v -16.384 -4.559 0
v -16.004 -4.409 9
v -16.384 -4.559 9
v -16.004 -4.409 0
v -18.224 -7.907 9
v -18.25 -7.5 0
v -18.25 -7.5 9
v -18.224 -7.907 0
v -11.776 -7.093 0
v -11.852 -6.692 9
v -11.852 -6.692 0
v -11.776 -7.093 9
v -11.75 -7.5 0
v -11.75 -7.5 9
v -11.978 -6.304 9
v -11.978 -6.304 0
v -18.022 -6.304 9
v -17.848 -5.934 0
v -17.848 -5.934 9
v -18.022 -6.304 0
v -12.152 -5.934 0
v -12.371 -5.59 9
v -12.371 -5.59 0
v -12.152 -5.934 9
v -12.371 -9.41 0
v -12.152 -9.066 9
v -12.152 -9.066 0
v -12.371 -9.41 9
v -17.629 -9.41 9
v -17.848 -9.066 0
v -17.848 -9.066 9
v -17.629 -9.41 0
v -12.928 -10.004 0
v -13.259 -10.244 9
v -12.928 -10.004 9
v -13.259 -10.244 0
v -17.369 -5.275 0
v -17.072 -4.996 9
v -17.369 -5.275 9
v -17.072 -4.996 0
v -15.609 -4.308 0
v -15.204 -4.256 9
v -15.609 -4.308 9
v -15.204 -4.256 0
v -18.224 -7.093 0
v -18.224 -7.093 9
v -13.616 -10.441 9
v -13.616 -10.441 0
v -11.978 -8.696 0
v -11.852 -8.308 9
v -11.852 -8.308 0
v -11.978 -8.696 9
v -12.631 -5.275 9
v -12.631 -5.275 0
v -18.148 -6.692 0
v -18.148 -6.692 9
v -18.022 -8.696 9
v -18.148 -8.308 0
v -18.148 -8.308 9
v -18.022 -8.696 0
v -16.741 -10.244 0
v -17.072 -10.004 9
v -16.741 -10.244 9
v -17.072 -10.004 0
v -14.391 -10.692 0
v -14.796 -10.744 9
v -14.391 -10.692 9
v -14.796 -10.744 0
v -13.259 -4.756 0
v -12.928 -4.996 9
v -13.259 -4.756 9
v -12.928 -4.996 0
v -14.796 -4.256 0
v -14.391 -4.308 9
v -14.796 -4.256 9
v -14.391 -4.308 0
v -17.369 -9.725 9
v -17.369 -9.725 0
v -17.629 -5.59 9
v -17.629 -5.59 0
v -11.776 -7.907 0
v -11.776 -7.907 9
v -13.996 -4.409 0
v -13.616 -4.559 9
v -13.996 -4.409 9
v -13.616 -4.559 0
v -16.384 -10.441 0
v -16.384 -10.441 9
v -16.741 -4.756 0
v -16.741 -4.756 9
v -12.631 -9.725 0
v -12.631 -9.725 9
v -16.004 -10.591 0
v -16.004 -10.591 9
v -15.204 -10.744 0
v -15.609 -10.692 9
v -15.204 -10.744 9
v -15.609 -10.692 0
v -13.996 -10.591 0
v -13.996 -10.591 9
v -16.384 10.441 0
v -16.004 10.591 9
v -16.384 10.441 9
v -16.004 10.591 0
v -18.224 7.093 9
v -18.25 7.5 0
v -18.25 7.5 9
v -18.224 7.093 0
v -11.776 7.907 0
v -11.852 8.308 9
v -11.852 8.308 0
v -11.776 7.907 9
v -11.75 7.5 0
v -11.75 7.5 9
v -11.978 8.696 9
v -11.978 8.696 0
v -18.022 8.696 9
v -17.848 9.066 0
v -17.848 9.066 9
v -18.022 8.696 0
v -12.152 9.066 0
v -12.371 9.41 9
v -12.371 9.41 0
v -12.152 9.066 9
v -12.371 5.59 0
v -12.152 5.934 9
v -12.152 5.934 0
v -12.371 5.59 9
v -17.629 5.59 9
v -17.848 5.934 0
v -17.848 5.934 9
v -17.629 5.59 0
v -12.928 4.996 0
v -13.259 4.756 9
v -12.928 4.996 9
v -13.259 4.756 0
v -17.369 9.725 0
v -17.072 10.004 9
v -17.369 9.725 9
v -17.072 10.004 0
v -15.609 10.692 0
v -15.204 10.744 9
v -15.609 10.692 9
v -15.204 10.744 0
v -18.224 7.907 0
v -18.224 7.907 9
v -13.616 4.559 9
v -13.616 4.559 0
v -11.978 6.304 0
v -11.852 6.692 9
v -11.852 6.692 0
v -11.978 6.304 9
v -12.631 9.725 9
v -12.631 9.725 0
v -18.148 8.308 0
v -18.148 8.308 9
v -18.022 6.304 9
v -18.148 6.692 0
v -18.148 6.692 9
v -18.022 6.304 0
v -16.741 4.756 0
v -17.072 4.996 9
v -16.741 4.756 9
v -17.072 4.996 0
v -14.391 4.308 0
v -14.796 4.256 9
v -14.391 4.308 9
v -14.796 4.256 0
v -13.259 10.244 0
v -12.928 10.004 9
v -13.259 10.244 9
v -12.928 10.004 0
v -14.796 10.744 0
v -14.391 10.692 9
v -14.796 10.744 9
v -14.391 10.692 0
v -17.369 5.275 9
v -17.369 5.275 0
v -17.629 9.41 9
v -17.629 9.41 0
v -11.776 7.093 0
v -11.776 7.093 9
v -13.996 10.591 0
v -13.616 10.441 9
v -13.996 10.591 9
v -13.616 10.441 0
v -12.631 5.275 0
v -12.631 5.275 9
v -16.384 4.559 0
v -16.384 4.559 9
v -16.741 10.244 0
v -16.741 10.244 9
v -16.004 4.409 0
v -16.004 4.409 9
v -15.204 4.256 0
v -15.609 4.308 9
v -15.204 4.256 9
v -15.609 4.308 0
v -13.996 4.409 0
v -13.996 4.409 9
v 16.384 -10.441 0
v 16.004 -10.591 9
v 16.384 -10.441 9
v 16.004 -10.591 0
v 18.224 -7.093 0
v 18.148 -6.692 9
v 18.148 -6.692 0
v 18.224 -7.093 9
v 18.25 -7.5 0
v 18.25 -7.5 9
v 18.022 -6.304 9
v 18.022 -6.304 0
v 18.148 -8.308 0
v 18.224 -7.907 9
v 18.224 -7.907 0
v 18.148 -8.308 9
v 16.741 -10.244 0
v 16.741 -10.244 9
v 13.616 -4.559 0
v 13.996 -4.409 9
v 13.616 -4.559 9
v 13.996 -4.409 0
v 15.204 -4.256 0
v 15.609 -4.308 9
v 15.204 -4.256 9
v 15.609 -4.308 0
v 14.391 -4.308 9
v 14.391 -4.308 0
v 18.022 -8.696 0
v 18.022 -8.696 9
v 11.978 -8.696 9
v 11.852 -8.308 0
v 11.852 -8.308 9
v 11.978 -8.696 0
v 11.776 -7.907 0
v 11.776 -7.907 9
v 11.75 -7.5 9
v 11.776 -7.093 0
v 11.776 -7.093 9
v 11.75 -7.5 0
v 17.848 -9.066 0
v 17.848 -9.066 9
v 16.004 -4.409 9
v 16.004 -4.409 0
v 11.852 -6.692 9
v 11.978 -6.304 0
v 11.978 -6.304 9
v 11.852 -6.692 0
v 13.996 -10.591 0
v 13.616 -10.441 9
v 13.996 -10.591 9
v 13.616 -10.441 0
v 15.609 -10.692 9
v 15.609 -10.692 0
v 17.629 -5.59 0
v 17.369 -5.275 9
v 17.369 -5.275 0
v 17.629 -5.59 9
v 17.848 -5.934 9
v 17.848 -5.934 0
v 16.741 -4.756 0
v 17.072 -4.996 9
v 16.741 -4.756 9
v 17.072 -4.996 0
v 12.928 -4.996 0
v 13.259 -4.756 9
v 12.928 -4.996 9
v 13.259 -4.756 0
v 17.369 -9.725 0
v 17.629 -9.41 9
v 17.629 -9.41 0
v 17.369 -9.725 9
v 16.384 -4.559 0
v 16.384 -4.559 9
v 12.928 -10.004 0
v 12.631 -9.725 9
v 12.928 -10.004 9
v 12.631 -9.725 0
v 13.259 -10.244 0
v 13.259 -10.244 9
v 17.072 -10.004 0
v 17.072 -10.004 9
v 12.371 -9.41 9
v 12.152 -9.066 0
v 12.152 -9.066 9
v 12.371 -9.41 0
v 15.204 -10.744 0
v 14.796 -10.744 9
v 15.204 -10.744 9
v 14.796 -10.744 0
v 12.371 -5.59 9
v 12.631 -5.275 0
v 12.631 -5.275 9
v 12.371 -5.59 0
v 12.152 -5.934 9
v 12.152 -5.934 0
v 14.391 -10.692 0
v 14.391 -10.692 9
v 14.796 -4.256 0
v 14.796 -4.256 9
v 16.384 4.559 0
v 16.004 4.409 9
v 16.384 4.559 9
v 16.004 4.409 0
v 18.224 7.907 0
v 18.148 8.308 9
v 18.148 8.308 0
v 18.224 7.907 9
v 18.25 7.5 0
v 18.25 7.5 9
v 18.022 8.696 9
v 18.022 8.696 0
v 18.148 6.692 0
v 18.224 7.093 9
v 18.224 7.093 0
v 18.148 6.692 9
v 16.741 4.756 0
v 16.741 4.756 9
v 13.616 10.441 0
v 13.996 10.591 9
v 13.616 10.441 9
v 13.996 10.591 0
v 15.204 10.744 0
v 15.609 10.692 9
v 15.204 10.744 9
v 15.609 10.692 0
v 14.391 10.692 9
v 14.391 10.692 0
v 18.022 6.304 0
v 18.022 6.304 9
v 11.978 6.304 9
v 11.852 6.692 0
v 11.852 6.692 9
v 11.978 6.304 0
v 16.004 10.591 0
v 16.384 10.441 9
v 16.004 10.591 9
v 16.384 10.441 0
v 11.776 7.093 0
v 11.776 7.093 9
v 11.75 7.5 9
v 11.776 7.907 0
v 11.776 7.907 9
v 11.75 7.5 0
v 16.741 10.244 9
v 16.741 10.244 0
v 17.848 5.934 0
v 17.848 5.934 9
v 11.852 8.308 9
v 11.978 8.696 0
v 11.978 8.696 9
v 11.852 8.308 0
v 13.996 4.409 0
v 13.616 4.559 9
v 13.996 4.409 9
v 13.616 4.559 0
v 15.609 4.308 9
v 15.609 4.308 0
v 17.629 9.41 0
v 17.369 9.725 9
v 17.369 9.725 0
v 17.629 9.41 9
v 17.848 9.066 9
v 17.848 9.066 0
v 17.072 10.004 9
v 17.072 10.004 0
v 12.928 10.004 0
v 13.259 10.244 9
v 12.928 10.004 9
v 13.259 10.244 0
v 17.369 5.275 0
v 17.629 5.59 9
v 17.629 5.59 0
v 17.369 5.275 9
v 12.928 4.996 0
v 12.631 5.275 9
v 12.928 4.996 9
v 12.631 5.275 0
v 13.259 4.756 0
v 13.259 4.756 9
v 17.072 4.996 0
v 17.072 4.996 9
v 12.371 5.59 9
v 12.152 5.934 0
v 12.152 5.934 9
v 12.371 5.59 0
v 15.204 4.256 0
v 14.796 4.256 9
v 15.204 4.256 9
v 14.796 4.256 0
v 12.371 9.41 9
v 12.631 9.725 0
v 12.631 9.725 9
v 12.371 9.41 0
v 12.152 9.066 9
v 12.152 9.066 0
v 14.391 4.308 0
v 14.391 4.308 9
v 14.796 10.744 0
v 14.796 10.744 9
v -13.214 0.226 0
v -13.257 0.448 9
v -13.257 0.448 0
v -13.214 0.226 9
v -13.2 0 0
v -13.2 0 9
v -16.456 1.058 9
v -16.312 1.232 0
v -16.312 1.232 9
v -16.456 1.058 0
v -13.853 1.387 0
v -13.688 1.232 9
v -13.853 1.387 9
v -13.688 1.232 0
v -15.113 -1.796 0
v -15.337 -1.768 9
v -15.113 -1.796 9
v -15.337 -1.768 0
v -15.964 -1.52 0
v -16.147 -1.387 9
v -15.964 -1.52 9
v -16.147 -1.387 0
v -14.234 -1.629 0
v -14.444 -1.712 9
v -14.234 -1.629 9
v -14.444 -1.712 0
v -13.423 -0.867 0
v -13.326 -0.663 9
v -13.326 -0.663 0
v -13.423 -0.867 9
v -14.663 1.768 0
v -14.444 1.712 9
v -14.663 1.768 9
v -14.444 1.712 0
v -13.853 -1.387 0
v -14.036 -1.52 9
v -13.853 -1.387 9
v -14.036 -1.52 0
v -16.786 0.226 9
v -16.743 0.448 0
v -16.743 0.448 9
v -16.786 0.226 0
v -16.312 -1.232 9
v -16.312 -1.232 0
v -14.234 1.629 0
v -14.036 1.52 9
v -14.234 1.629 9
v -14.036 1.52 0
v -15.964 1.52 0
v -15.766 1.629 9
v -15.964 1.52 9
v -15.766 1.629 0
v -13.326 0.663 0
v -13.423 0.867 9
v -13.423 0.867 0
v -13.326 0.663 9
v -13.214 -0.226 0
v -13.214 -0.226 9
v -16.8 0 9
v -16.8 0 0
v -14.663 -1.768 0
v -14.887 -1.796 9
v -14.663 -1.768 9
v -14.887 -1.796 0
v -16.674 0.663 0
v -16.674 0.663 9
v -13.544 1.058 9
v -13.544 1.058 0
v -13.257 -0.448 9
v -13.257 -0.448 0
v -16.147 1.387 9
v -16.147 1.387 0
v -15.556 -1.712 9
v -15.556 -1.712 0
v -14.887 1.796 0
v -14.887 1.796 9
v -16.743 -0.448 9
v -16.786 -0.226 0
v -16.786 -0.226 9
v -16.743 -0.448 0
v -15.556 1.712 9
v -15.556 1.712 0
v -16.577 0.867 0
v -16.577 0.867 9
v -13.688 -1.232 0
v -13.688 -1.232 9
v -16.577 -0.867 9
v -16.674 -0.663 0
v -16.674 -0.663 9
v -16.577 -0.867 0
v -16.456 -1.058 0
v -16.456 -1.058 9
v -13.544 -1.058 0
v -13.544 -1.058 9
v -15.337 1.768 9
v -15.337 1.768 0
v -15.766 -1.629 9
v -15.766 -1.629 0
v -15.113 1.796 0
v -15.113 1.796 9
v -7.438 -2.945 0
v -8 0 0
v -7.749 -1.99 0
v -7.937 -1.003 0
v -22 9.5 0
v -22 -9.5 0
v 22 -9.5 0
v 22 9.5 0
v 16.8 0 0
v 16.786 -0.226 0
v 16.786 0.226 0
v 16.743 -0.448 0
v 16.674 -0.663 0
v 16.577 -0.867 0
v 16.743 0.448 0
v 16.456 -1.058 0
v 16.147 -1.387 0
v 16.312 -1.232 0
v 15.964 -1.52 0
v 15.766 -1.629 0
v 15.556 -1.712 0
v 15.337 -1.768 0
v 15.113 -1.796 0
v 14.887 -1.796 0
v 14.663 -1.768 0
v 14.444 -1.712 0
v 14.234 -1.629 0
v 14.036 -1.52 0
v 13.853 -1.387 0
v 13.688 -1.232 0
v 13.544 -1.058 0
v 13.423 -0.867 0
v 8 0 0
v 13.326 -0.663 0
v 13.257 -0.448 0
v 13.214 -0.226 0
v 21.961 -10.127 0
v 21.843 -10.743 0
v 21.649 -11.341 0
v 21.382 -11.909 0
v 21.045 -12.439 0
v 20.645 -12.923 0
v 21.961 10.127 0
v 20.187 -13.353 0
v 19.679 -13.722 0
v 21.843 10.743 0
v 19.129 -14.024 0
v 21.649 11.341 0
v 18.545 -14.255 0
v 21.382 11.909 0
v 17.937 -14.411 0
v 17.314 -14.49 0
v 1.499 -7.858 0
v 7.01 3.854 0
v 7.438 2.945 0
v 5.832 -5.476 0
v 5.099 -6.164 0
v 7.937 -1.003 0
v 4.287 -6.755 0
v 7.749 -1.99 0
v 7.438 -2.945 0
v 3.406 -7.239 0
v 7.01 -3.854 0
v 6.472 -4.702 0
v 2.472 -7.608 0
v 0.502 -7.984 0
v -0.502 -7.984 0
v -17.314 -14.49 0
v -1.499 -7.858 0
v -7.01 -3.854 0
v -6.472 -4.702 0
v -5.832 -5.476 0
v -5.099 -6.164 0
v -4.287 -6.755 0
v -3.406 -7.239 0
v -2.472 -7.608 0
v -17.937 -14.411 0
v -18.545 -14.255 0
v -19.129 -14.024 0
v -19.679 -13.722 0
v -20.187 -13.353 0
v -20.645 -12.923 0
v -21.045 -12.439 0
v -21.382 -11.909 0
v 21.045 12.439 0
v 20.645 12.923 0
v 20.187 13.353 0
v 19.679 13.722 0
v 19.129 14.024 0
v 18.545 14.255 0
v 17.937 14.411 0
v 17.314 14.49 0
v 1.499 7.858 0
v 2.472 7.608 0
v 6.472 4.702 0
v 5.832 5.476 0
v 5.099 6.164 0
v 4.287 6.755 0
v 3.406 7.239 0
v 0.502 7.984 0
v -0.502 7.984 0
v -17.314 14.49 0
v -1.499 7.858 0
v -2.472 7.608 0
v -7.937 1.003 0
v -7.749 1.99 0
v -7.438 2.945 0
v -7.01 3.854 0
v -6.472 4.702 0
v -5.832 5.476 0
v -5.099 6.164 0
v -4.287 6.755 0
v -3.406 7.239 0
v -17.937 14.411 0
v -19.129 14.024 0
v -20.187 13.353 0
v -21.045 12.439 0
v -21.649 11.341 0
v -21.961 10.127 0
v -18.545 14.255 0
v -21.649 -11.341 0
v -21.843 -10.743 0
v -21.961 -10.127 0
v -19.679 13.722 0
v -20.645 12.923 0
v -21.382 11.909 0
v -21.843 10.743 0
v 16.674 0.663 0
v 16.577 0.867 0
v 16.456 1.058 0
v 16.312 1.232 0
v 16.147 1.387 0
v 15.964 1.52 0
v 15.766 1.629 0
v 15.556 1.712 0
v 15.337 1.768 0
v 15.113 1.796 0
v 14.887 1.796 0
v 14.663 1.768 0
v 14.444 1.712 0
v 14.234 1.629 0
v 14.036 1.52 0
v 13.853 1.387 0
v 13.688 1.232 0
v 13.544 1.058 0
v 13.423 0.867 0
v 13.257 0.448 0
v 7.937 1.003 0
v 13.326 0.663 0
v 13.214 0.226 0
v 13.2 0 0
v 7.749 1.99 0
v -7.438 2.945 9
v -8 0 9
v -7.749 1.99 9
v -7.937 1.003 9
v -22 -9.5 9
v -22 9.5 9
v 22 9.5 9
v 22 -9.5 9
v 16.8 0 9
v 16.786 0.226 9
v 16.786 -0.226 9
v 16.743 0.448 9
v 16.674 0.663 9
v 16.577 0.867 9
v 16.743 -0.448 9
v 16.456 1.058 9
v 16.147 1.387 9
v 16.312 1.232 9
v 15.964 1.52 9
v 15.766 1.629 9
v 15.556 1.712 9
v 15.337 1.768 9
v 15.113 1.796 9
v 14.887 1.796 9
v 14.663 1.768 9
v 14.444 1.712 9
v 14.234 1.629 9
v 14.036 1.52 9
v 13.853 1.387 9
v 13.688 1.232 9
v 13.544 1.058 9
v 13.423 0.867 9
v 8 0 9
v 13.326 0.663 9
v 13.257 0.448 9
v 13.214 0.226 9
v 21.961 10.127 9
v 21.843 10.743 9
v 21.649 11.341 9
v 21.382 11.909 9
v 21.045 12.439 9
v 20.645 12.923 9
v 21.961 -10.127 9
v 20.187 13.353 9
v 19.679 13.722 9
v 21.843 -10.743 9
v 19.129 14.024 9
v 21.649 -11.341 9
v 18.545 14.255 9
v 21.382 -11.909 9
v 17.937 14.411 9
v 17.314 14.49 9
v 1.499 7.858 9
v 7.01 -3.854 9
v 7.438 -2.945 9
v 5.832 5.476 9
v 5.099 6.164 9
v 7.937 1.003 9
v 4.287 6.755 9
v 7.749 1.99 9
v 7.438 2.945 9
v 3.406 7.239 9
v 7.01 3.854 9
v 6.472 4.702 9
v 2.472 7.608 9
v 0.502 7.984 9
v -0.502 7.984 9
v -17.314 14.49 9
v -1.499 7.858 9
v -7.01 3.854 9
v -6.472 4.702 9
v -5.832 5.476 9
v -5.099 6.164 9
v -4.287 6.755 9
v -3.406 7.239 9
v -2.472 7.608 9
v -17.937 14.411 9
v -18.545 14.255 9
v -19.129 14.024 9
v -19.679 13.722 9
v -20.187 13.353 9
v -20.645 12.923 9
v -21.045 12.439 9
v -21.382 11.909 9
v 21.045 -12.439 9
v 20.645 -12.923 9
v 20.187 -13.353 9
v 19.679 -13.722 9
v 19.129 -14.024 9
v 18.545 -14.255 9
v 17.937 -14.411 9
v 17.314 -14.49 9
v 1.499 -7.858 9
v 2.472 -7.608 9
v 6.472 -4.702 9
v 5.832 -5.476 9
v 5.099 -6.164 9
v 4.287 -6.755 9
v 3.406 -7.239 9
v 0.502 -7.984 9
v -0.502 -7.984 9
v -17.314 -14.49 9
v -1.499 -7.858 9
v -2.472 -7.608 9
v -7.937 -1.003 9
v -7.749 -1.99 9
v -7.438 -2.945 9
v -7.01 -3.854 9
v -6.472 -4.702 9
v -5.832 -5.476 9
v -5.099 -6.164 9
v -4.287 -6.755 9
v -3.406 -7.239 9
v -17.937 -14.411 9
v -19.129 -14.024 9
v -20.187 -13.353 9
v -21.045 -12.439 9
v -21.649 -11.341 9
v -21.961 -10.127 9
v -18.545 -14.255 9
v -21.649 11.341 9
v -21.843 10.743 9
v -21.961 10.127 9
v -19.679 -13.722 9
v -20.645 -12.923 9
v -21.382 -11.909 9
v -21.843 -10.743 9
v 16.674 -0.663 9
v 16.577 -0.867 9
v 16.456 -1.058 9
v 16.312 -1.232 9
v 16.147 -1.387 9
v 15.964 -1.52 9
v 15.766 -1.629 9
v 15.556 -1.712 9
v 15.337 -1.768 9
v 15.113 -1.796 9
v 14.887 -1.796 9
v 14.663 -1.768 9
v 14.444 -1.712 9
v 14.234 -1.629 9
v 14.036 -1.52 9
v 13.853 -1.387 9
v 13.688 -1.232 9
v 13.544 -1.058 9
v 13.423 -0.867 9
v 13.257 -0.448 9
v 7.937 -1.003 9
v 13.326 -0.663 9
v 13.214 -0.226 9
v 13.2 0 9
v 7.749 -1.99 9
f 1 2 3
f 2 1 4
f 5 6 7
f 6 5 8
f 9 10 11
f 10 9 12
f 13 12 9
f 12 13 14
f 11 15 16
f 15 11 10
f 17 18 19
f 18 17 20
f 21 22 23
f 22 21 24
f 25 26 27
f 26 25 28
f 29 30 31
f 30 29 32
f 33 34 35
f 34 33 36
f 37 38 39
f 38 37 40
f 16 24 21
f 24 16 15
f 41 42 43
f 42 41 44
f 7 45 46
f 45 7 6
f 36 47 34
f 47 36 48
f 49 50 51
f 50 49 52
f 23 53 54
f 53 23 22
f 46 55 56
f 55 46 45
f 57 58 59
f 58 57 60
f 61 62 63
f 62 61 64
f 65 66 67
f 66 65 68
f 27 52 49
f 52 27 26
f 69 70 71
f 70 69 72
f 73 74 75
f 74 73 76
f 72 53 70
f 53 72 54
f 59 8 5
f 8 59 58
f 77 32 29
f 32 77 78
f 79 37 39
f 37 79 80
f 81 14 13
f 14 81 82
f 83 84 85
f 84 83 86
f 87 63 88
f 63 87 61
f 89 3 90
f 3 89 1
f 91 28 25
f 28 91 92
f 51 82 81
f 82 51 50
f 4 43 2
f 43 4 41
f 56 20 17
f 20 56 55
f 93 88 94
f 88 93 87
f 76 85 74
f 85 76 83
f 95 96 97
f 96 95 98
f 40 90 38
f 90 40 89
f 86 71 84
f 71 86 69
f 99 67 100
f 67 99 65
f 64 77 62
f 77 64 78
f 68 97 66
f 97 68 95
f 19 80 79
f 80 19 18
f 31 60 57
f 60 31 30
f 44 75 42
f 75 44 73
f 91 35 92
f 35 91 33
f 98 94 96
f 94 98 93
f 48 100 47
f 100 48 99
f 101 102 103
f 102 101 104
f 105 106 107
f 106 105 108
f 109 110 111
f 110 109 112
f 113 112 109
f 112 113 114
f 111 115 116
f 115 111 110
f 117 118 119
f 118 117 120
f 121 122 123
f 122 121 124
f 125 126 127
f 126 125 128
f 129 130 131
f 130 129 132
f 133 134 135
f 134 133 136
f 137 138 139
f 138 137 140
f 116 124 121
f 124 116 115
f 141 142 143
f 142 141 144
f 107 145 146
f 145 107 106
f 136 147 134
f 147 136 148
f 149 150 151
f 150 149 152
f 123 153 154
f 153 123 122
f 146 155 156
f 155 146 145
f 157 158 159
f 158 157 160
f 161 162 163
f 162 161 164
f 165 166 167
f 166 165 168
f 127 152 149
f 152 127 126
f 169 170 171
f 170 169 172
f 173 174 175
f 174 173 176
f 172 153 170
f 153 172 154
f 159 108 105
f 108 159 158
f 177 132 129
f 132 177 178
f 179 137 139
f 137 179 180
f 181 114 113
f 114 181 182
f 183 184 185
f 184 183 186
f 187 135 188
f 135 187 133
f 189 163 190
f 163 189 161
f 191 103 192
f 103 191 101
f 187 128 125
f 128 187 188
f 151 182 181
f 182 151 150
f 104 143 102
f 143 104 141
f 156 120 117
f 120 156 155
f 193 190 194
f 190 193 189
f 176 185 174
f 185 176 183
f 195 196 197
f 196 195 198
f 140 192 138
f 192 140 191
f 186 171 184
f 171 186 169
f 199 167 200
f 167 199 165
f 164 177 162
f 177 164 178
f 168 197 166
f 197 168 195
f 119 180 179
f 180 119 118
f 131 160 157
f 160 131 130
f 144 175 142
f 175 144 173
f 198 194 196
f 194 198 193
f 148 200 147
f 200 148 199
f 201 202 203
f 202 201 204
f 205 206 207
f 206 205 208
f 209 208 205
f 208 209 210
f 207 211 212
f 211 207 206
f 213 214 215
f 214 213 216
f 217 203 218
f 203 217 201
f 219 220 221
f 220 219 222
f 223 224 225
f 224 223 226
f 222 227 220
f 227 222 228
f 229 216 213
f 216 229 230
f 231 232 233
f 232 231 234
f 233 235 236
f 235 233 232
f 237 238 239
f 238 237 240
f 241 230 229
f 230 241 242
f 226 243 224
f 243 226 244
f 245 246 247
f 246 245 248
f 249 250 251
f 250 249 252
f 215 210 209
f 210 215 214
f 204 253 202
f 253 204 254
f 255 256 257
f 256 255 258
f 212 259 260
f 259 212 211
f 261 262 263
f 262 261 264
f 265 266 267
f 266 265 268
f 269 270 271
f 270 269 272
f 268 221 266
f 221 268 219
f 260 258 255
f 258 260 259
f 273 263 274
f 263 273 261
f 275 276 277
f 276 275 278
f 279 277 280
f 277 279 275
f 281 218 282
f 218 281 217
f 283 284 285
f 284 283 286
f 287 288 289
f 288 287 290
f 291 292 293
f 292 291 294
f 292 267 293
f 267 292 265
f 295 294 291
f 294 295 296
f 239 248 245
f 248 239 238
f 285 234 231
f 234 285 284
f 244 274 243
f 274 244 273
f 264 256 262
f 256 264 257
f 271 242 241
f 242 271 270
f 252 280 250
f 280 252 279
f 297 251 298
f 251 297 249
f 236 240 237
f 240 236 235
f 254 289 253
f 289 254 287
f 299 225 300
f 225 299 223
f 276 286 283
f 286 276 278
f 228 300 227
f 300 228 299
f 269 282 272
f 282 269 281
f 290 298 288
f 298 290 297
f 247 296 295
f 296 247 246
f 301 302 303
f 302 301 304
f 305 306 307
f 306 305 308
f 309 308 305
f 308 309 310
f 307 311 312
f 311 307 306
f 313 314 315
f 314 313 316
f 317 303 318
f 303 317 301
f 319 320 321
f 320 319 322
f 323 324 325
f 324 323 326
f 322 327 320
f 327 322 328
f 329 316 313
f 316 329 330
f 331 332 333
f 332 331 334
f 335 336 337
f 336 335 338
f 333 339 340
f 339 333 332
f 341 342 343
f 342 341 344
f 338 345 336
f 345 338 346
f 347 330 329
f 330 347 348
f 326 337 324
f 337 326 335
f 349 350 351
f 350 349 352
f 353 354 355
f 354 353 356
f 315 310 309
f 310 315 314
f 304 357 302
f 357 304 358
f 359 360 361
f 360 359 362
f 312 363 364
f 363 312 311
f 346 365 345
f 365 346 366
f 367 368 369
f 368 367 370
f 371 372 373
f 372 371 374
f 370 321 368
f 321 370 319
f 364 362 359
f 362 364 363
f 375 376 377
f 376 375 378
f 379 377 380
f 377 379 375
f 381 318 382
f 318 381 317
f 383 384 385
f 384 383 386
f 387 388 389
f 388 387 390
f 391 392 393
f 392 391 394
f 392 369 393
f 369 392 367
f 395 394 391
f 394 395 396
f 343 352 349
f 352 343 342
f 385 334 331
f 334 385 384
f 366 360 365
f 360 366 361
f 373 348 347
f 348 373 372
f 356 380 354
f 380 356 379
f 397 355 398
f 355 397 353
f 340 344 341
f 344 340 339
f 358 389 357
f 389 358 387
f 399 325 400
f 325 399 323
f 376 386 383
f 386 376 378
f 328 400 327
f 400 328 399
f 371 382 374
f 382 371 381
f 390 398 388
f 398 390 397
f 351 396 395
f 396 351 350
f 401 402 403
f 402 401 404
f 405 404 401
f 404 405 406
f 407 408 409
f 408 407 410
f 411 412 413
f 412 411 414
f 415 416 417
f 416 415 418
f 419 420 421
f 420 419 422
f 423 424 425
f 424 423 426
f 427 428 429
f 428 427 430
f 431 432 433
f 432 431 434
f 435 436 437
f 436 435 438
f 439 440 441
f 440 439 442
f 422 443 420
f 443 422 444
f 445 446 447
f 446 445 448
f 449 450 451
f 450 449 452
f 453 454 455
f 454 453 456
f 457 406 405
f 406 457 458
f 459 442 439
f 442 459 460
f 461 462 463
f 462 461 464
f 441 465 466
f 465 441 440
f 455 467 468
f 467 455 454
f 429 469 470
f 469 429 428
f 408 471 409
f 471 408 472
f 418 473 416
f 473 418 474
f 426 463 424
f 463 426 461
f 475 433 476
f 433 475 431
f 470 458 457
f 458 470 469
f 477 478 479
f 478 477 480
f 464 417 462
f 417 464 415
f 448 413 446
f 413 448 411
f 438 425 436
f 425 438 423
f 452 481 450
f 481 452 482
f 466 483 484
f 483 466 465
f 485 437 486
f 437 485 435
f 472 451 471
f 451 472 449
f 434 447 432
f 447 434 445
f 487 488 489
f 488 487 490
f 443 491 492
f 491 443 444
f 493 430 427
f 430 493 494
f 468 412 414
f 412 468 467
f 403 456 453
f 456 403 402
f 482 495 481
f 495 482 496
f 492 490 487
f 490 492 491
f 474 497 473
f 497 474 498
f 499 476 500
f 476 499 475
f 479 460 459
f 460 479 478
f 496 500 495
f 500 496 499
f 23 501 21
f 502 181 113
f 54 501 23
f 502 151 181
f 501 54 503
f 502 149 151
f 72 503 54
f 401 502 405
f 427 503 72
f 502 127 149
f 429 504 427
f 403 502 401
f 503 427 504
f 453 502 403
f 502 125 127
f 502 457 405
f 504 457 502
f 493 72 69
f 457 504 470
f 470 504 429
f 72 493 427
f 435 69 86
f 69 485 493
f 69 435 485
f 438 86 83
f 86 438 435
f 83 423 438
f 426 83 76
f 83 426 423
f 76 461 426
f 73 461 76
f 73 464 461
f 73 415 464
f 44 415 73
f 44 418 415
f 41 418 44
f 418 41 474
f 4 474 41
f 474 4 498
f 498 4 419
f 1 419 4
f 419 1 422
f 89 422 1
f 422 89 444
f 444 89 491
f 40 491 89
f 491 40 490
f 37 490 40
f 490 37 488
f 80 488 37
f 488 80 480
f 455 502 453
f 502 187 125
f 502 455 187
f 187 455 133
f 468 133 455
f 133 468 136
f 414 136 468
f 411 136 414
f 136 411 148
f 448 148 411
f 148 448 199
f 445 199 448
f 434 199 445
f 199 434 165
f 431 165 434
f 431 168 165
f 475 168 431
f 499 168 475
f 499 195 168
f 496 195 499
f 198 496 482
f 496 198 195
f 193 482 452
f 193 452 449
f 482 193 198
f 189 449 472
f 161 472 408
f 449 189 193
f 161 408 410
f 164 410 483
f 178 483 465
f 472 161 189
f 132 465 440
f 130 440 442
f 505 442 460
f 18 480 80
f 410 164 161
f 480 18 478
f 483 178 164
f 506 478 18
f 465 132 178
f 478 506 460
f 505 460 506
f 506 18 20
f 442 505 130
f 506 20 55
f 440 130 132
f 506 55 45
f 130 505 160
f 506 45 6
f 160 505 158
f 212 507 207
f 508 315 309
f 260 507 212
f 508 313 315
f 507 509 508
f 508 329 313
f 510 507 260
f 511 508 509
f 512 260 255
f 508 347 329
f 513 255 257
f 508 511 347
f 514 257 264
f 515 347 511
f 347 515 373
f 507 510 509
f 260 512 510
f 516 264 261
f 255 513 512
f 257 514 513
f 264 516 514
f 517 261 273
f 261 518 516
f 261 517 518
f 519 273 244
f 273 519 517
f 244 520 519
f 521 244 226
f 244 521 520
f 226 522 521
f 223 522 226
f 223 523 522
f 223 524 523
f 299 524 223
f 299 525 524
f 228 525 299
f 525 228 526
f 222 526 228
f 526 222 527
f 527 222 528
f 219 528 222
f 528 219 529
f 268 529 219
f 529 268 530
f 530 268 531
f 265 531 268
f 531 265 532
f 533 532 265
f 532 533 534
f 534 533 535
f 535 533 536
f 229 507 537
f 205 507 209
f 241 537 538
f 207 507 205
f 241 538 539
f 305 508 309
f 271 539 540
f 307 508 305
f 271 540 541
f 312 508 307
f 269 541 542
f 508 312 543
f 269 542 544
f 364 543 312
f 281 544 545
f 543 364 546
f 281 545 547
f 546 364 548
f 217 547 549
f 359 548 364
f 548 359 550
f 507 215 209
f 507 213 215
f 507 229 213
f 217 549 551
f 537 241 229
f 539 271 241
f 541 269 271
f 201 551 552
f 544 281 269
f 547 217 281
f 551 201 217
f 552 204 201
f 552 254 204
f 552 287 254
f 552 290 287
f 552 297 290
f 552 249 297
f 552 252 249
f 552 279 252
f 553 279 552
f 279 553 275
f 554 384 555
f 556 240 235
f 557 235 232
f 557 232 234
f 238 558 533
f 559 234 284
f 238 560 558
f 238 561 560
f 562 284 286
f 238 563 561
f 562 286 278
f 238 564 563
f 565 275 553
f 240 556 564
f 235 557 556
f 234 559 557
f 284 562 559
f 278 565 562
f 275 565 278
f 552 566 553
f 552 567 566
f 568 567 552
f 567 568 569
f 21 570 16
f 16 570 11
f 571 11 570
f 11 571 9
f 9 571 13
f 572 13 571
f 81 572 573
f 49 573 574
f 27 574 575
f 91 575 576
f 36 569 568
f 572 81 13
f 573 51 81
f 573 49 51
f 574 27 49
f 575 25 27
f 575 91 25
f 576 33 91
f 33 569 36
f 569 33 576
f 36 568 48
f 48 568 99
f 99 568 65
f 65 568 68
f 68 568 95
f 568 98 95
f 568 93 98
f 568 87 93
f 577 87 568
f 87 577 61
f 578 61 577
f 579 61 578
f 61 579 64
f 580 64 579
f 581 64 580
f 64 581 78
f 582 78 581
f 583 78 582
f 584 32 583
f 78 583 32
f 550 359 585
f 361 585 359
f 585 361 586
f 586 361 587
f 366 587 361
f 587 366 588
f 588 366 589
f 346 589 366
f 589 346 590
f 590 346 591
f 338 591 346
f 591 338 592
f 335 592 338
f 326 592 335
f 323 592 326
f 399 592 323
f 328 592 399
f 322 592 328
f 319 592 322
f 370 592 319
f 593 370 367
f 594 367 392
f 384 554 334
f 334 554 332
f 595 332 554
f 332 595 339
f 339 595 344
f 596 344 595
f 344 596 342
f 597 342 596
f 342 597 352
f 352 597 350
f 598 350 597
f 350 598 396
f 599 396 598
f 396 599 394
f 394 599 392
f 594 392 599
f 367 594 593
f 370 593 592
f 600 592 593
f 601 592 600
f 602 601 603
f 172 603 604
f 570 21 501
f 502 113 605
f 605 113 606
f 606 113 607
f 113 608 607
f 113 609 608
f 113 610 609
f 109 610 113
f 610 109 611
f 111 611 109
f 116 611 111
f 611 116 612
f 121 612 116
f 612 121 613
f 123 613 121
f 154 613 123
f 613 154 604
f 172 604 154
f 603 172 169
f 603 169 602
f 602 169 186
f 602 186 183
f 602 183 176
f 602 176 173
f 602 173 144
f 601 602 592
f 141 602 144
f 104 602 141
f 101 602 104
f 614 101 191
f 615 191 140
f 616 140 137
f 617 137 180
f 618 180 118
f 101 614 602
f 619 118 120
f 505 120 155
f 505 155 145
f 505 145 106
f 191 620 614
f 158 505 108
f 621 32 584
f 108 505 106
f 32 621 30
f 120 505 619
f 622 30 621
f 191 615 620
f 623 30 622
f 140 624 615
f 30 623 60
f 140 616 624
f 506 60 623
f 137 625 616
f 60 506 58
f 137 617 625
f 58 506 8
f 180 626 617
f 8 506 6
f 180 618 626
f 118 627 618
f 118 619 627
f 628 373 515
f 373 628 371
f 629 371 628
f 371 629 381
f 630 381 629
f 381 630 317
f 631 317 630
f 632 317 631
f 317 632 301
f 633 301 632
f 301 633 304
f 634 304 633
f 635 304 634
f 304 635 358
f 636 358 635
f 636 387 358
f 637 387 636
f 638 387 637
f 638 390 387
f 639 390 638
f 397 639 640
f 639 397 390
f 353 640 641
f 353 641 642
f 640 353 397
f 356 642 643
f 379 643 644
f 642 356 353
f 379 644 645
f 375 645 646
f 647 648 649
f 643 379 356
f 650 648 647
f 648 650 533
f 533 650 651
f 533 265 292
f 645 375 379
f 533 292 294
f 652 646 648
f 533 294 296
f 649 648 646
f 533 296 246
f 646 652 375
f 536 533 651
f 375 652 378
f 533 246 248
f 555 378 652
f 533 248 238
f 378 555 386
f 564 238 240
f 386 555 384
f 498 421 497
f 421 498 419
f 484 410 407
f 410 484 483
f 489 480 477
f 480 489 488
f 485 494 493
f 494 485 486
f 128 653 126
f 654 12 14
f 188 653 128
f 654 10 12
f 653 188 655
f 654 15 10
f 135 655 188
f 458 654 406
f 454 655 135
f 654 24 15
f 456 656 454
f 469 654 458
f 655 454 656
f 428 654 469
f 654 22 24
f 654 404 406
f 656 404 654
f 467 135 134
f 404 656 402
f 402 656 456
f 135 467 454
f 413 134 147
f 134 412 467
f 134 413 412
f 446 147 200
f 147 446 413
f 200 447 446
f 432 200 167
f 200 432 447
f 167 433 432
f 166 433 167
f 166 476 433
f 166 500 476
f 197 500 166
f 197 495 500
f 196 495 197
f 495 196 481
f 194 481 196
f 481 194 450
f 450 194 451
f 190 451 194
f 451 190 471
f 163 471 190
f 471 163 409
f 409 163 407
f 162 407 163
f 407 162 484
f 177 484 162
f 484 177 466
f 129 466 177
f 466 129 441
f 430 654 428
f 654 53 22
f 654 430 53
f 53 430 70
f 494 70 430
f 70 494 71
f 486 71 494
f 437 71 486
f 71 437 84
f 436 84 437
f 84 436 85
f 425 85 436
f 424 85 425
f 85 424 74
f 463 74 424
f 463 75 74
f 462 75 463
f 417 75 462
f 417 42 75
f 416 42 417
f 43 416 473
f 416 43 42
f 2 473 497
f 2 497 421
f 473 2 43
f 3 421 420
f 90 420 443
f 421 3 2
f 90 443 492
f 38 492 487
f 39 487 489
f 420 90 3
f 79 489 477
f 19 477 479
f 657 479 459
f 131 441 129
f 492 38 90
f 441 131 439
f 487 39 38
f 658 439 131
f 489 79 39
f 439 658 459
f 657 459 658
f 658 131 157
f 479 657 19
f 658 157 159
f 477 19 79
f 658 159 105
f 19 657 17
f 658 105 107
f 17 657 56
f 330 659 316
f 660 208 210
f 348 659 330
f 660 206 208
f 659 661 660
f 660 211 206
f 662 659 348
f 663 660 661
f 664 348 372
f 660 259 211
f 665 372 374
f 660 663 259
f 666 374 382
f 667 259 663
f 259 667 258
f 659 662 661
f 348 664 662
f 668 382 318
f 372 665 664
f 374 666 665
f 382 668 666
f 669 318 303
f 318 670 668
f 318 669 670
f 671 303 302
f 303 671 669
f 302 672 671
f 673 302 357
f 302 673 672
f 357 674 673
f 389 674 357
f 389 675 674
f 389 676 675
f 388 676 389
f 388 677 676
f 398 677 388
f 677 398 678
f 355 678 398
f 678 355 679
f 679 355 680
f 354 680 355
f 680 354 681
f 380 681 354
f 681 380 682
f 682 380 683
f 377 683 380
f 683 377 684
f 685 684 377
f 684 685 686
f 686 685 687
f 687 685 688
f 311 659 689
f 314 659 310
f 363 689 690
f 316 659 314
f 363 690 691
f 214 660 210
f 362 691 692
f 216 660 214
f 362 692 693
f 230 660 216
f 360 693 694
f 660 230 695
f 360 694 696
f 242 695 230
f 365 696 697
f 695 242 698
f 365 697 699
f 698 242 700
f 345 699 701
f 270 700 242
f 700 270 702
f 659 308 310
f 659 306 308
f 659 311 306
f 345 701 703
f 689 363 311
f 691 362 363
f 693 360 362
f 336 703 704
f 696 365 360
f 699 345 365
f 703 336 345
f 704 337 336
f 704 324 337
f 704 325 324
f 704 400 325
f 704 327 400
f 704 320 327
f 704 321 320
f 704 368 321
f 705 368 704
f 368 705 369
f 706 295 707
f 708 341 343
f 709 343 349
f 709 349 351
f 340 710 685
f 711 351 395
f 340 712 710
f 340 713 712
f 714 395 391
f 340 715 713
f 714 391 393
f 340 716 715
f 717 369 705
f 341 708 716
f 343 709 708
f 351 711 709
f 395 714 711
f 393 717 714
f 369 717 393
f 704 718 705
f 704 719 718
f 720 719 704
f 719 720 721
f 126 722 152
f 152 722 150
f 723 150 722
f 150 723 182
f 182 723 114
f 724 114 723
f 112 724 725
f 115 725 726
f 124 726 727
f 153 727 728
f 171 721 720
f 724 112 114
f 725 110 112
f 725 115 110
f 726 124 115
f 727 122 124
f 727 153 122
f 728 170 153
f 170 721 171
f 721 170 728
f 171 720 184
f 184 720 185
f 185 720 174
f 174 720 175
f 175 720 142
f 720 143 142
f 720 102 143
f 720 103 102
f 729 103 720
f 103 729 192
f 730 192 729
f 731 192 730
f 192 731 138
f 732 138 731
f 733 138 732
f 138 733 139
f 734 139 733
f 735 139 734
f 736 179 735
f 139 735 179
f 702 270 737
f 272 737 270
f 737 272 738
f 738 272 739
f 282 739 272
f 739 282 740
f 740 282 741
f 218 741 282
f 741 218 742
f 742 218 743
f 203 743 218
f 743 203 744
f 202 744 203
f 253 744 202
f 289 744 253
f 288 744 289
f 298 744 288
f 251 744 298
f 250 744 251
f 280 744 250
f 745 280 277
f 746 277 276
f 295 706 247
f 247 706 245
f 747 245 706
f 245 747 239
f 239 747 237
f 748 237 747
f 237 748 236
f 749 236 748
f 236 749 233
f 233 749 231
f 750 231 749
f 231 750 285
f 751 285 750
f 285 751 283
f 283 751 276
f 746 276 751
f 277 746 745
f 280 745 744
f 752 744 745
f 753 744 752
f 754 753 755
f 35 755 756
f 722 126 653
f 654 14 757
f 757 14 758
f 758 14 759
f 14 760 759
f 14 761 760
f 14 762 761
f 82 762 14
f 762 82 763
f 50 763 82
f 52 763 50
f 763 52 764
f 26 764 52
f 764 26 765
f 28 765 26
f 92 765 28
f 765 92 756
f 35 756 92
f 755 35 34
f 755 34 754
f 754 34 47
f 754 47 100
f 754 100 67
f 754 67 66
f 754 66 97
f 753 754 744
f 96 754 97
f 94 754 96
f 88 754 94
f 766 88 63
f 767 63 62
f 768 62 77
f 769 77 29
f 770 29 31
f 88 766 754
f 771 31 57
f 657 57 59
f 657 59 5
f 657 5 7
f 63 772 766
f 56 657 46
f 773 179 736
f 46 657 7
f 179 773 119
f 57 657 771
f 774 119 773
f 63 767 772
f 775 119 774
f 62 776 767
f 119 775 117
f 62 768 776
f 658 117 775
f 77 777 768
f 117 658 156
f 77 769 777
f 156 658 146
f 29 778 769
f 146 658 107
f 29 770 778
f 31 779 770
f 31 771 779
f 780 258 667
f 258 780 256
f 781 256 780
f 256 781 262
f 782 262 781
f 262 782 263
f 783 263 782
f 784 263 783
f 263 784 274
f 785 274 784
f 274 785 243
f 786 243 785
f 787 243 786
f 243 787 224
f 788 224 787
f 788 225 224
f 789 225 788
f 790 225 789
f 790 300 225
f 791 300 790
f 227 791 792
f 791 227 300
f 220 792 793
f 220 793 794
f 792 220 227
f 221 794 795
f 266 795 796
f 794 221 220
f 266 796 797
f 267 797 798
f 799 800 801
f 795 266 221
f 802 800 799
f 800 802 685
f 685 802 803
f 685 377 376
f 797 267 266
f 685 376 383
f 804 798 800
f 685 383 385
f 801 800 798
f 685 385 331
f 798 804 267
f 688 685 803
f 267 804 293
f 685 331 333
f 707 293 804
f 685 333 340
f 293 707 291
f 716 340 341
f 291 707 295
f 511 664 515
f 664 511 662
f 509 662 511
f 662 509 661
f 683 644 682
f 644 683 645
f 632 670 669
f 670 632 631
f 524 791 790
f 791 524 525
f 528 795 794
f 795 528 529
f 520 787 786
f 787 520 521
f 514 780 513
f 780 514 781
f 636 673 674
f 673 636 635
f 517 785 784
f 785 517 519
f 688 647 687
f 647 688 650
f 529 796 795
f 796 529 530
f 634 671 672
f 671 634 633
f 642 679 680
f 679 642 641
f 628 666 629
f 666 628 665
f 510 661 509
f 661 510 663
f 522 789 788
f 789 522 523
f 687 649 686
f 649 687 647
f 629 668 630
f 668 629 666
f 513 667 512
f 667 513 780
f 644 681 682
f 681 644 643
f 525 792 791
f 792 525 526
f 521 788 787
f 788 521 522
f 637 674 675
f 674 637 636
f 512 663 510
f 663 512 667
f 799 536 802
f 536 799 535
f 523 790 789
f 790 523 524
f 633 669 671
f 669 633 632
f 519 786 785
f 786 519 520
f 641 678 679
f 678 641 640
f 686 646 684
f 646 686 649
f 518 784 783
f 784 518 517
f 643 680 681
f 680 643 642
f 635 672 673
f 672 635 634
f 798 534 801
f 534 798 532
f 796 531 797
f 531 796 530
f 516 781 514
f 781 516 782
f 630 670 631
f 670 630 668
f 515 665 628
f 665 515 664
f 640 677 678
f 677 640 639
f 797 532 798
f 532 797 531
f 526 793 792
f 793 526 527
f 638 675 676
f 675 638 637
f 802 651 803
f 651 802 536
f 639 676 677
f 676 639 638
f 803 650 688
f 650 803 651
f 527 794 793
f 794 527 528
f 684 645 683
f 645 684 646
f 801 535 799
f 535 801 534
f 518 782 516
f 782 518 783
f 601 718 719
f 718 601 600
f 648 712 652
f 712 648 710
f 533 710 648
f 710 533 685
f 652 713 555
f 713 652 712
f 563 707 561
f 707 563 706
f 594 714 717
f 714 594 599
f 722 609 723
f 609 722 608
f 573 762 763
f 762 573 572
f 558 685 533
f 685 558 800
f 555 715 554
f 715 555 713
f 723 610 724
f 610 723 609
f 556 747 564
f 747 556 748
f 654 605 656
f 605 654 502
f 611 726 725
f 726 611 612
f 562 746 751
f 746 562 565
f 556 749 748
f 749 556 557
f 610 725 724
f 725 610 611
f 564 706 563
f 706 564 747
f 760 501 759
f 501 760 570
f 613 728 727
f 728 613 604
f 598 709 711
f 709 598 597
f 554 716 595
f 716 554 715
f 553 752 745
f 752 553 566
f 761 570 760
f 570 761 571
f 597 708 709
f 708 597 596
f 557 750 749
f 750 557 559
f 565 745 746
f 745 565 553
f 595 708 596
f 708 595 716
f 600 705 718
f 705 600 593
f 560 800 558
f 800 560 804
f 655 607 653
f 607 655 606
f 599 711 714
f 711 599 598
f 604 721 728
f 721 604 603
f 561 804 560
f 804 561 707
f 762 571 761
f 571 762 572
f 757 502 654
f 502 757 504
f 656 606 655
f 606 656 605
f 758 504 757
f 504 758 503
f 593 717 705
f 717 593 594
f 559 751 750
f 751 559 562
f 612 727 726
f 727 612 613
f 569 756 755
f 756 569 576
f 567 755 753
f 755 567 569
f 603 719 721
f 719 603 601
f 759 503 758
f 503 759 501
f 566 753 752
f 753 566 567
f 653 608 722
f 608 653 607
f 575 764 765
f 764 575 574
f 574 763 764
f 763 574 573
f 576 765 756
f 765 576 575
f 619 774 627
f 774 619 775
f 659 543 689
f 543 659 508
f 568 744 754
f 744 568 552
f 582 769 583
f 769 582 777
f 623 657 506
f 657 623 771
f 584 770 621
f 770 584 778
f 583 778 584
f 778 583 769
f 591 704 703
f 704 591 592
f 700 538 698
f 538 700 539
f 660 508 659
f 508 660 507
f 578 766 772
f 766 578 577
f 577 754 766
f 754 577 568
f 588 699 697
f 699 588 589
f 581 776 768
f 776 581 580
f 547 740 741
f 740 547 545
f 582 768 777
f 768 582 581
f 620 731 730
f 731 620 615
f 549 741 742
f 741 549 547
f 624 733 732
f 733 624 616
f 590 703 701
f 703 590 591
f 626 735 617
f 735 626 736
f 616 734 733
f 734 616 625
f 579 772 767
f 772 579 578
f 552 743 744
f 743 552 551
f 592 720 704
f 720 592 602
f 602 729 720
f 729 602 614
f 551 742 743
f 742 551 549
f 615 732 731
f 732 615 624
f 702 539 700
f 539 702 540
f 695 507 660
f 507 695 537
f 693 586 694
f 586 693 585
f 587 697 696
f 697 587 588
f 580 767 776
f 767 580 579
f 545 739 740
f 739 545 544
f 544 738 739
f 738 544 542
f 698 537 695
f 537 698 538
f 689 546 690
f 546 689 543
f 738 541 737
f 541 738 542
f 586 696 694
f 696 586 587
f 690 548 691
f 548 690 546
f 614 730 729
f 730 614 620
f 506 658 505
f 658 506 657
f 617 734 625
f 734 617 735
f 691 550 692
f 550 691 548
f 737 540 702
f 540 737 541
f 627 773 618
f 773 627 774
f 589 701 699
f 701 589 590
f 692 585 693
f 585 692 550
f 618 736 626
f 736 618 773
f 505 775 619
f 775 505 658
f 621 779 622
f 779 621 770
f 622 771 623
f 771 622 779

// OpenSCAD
$fn = 50;


difference() {
	union() {
		hull() {
			translate(v = [-17.0000000000, 9.5000000000, 0]) {
				cylinder(h = 9, r = 5);
			}
			translate(v = [17.0000000000, 9.5000000000, 0]) {
				cylinder(h = 9, r = 5);
			}
			translate(v = [-17.0000000000, -9.5000000000, 0]) {
				cylinder(h = 9, r = 5);
			}
			translate(v = [17.0000000000, -9.5000000000, 0]) {
				cylinder(h = 9, r = 5);
			}
		}
	}
	union() {
		#translate(v = [-15.0000000000, -7.5000000000, 0]) {
			cylinder(h = 9, r = 3.2500000000);
		}
		#translate(v = [-15.0000000000, 7.5000000000, 0]) {
			cylinder(h = 9, r = 3.2500000000);
		}
		#translate(v = [15.0000000000, -7.5000000000, 0]) {
			cylinder(h = 9, r = 3.2500000000);
		}
		#translate(v = [15.0000000000, 7.5000000000, 0]) {
			cylinder(h = 9, r = 3.2500000000);
		}
		#translate(v = [-15.0000000000, -7.5000000000, -100.0000000000]) {
			cylinder(h = 200, r = 3.2500000000);
		}
		#translate(v = [-15.0000000000, 7.5000000000, -100.0000000000]) {
			cylinder(h = 200, r = 3.2500000000);
		}
		#translate(v = [15.0000000000, -7.5000000000, -100.0000000000]) {
			cylinder(h = 200, r = 3.2500000000);
		}
		#translate(v = [15.0000000000, 7.5000000000, -100.0000000000]) {
			cylinder(h = 200, r = 3.2500000000);
		}
		#translate(v = [-15.0000000000, -7.5000000000, 0]) {
			cylinder(h = 9, r = 1.8000000000);
		}
		#translate(v = [-15.0000000000, 0.0000000000, 0]) {
			cylinder(h = 9, r = 1.8000000000);
		}
		#translate(v = [-15.0000000000, 7.5000000000, 0]) {
			cylinder(h = 9, r = 1.8000000000);
		}
		#translate(v = [15.0000000000, -7.5000000000, 0]) {
			cylinder(h = 9, r = 1.8000000000);
		}
		#translate(v = [15.0000000000, 0.0000000000, 0]) {
			cylinder(h = 9, r = 1.8000000000);
		}
		#translate(v = [15.0000000000, 7.5000000000, 0]) {
			cylinder(h = 9, r = 1.8000000000);
		}
		#translate(v = [-15.0000000000, -7.5000000000, 0]) {
			cylinder(h = 9, r = 1.8000000000);
		}
		#translate(v = [-15.0000000000, 0.0000000000, 0]) {
			cylinder(h = 9, r = 1.8000000000);
		}
		#translate(v = [-15.0000000000, 7.5000000000, 0]) {
			cylinder(h = 9, r = 1.8000000000);
		}
		#translate(v = [15.0000000000, -7.5000000000, 0]) {
			cylinder(h = 9, r = 1.8000000000);
		}
		#translate(v = [15.0000000000, 0.0000000000, 0]) {
			cylinder(h = 9, r = 1.8000000000);
		}
		#translate(v = [15.0000000000, 7.5000000000, 0]) {
			cylinder(h = 9, r = 1.8000000000);
		}
		#translate(v = [-15.0000000000, -7.5000000000, 0]) {
			cylinder(h = 9, r = 1.8000000000);
		}
		#translate(v = [-15.0000000000, 0.0000000000, 0]) {
			cylinder(h = 9, r = 1.8000000000);
		}
		#translate(v = [-15.0000000000, 7.5000000000, 0]) {
			cylinder(h = 9, r = 1.8000000000);
		}
		#translate(v = [15.0000000000, -7.5000000000, 0]) {
			cylinder(h = 9, r = 1.8000000000);
		}
		#translate(v = [15.0000000000, 0.0000000000, 0]) {
			cylinder(h = 9, r = 1.8000000000);
		}
		#translate(v = [15.0000000000, 7.5000000000, 0]) {
			cylinder(h = 9, r = 1.8000000000);
		}
		#cylinder(h = 9, r = 8.0000000000);
	}
}
